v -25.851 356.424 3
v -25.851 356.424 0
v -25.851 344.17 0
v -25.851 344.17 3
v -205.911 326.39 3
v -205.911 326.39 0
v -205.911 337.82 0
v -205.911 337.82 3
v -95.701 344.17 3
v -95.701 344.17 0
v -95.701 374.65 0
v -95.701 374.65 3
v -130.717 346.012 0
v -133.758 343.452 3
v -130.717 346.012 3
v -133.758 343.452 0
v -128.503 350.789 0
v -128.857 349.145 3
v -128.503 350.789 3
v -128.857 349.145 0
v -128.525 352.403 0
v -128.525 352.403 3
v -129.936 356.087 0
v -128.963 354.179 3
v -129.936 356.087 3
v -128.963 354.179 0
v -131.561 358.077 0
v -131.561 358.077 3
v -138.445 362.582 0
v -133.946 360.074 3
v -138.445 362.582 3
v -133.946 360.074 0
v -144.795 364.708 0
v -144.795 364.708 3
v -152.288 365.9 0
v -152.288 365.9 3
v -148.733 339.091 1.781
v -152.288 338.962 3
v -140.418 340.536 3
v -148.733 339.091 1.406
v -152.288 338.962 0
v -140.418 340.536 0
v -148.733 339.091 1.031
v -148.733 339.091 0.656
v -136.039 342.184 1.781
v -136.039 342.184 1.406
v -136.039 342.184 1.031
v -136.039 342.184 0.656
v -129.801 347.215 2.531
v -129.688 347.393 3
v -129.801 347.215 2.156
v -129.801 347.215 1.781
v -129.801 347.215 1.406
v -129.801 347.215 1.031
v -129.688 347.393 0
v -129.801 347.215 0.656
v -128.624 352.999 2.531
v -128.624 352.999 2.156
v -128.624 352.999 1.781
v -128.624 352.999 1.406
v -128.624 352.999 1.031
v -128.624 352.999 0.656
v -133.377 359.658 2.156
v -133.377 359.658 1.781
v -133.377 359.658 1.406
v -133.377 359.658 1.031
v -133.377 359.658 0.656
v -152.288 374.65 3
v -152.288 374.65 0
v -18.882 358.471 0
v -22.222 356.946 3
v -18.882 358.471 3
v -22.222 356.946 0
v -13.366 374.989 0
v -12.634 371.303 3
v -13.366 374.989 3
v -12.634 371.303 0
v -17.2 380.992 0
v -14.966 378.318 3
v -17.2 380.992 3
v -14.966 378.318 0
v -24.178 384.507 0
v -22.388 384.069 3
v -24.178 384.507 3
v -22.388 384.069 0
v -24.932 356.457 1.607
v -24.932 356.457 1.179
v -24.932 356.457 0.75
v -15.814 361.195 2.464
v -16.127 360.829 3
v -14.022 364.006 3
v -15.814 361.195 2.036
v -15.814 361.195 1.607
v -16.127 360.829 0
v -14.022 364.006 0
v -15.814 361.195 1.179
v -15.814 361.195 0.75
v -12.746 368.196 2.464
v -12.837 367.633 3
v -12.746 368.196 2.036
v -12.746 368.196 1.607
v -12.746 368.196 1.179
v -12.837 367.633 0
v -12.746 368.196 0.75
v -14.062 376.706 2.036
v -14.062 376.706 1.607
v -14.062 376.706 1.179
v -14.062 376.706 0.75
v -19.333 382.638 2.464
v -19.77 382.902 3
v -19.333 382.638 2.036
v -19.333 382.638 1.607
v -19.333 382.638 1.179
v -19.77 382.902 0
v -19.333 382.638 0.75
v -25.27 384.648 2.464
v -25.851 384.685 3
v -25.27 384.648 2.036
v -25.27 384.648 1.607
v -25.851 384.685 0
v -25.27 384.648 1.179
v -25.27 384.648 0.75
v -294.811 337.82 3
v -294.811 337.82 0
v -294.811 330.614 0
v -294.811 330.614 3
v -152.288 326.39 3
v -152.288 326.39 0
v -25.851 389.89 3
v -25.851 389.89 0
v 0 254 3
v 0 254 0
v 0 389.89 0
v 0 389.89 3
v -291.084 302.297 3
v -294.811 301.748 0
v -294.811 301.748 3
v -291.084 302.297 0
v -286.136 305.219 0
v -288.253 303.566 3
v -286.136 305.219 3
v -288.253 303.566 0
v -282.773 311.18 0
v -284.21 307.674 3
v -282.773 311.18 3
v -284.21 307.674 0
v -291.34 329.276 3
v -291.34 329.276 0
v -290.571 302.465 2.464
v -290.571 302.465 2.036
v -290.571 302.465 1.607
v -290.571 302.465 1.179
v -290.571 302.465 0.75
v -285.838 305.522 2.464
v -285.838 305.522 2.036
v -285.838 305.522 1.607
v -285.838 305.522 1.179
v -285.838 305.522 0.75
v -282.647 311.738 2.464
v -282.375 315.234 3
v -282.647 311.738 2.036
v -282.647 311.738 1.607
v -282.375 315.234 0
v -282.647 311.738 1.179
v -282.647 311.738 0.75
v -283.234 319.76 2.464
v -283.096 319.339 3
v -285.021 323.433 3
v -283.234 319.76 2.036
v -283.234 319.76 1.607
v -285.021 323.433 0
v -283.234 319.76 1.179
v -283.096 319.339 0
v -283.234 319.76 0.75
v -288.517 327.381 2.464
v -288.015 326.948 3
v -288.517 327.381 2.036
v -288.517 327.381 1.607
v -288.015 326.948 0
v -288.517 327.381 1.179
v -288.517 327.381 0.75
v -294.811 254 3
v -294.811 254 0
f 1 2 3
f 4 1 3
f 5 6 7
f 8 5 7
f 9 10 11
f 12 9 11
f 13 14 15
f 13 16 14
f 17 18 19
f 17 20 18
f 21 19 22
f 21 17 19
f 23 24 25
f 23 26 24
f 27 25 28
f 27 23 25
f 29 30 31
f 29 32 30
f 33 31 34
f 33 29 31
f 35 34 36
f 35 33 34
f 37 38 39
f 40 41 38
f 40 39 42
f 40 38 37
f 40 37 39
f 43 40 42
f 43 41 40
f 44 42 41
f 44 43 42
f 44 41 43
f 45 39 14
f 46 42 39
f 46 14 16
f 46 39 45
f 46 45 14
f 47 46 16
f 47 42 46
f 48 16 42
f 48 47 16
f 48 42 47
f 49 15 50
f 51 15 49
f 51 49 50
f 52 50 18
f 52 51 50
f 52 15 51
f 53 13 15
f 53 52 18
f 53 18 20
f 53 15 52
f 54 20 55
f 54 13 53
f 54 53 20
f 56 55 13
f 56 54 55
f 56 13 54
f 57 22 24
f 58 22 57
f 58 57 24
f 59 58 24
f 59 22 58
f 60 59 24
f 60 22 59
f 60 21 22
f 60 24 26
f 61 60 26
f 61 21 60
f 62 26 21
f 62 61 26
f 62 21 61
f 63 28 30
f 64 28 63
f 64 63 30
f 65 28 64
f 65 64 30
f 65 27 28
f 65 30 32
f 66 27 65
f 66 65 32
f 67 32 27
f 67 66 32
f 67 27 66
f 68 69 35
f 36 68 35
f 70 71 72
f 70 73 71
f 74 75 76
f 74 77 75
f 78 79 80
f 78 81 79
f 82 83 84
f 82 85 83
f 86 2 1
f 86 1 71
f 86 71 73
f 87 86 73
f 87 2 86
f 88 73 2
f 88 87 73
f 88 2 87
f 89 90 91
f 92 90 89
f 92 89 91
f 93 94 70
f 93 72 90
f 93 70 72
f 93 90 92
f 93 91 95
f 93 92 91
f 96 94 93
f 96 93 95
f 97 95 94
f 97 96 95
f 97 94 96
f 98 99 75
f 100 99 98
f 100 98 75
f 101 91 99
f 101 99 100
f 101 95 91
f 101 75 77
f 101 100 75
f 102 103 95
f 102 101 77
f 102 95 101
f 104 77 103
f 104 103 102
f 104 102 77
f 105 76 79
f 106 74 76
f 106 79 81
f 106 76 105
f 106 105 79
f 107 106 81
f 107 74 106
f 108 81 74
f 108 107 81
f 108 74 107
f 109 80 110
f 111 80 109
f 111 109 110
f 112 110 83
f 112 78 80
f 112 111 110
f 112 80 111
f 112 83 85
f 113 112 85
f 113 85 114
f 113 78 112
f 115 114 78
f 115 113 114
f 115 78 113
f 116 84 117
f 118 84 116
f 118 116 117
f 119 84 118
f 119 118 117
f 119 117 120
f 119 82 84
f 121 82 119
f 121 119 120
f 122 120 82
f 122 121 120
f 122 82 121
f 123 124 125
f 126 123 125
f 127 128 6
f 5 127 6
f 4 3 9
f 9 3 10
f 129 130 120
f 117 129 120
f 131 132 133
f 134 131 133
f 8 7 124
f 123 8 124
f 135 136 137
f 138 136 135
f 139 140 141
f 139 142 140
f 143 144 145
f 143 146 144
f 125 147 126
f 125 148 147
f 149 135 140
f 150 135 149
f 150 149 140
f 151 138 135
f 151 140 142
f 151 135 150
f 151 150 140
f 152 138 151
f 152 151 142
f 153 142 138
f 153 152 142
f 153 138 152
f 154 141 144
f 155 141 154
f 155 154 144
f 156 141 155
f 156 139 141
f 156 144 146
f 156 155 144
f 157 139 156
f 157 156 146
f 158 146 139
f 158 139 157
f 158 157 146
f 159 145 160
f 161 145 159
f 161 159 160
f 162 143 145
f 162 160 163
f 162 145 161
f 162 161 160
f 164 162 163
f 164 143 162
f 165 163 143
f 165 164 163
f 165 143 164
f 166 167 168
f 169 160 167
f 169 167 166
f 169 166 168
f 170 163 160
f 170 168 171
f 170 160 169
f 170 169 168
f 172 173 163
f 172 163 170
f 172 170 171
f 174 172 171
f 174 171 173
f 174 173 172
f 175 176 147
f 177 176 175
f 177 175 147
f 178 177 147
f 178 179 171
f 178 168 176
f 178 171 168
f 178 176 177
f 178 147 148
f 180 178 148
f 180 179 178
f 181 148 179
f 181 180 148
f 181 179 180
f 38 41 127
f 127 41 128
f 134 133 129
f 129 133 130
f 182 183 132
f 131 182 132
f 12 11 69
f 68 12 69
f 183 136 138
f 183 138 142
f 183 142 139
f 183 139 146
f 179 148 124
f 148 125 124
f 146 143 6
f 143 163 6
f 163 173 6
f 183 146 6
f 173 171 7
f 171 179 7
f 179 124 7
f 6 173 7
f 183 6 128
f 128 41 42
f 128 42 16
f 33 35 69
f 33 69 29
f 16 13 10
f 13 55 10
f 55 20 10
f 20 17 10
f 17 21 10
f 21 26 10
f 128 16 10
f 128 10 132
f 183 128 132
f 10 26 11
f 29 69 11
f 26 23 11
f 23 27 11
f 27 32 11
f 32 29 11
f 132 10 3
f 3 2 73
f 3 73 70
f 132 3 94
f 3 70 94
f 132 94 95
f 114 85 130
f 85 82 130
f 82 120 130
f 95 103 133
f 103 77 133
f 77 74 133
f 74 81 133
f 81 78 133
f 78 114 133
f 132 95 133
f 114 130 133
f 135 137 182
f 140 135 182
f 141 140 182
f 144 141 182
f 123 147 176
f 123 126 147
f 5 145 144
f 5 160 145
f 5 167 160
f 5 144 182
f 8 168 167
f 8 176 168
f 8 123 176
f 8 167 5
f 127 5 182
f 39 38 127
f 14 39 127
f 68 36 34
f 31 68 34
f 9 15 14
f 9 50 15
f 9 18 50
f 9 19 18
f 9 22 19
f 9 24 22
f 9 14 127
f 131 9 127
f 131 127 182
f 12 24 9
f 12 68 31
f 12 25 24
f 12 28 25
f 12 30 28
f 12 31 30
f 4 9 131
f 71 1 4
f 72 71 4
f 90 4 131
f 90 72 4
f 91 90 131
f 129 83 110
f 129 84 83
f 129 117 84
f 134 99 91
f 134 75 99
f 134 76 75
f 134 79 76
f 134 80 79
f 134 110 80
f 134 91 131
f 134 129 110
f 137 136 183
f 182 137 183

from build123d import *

# Parameters (mm, degrees)
BOSS_EXTRUDE2_OUTLINE_W = 330.2
BOSS_EXTRUDE2_OUTLINE_H = 190.5
BOSS_EXTRUDE2_DEPTH     = 3
CUT_EXTRUDE1_DEPTH      = 554.733952504


# Read off the part's stored shape, not the designer's step: Boss-Extrude2
with BuildPart() as part:
    # Boss-Extrude2 outline → Boss-Extrude2 (new body)
    with BuildSketch(Plane.XY):
        with Locations((-165.1, 349.25)):
            Rectangle(BOSS_EXTRUDE2_OUTLINE_W, BOSS_EXTRUDE2_OUTLINE_H)
        with BuildLine():
            add(Edge.make_bspline(
                [(-305.942171993, 328.501522762), (-306.170255378, 328.324665909), (-306.614042299, 327.954986533), (-307.512202671, 327.084665698), (-309.028565354, 325.224006494), (-310.814681605, 321.397067185), (-310.908770444, 315.937871104), (-309.331820466, 311.311401642), (-307.336526947, 308.049254205), (-304.674018188, 305.304468379), (-300.585989718, 302.625100143), (-295.275340887, 301.356761249), (-291.124175679, 302.133615904), (-288.944522893, 303.138863231), (-287.877956893, 303.791999802), (-287.175136962, 304.298621856), (-286.509456581, 304.853140919), (-285.611296208, 305.723461755), (-284.094933526, 307.584120959), (-282.308817275, 311.411060268), (-282.214728435, 316.870256349), (-283.791678414, 321.496725811), (-285.786971933, 324.758873247), (-288.449480692, 327.503659074), (-292.537509162, 330.18302731), (-297.848157993, 331.451366204), (-301.999323201, 330.674511549), (-304.178975987, 329.669264222), (-305.245541986, 329.01612765), (-305.714088607, 328.678379615), (-305.942171993, 328.501522762)],
                knots=[0, 0, 0, 0, 0.015625, 0.03125, 0.0625, 0.125, 0.1875, 0.21875, 0.25, 0.28125, 0.3125, 0.375, 0.4375, 0.46875, 0.484375, 0.5, 0.515625, 0.53125, 0.5625, 0.625, 0.6875, 0.71875, 0.75, 0.78125, 0.8125, 0.875, 0.9375, 0.96875, 0.984375, 1, 1, 1, 1], degree=3))
        make_face(mode=Mode.SUBTRACT)
        with BuildLine():
            add(Edge.make_bspline(
                [(-180.068905291, 353.920439433), (-180.085422965, 353.618309147), (-180.081950788, 353.012052683), (-179.905256871, 351.701966023), (-179.071932531, 349.235984489), (-176.547678646, 346.101494923), (-171.788832257, 343.101891305), (-167.066920591, 341.126264084), (-161.345782684, 339.656260684), (-155.018201929, 338.900335341), (-148.645925657, 338.961950616), (-142.798632236, 339.799499783), (-137.889488846, 341.248590487), (-132.832001497, 343.711528272), (-129.981083909, 346.552153454), (-128.883895778, 348.912592521), (-128.565435113, 350.195608733), (-128.461120803, 351.099005754), (-128.466329068, 352.008390451), (-128.643022986, 353.31847711), (-129.476347326, 355.784458645), (-132.000601211, 358.918948211), (-136.7594476, 361.918551828), (-141.481359266, 363.89417905), (-147.202497173, 365.36418245), (-153.530077928, 366.120107793), (-159.9023542, 366.058492517), (-165.74964762, 365.220943351), (-170.658791011, 363.771852646), (-175.71627836, 361.308914861), (-178.567195948, 358.468289679), (-179.664384078, 356.107850612), (-179.982844744, 354.8248344), (-180.052387617, 354.22256972), (-180.068905291, 353.920439433)],
                knots=[0, 0, 0, 0, 0.015625, 0.03125, 0.0625, 0.125, 0.15625, 0.1875, 0.21875, 0.25, 0.28125, 0.3125, 0.34375, 0.375, 0.4375, 0.46875, 0.484375, 0.5, 0.515625, 0.53125, 0.5625, 0.625, 0.65625, 0.6875, 0.71875, 0.75, 0.78125, 0.8125, 0.84375, 0.875, 0.9375, 0.96875, 0.984375, 1, 1, 1, 1], degree=3))
        make_face(mode=Mode.SUBTRACT)
        with BuildLine():
            add(Edge.make_bspline(
                [(-29.09461346, 384.409392838), (-29.375319528, 384.349132794), (-29.932845744, 384.210511135), (-31.115639474, 383.827797032), (-33.287380866, 382.853955405), (-36.5808932, 380.334793707), (-39.113343797, 375.767453995), (-39.778124595, 371.238575823), (-39.453462961, 367.698185468), (-38.296430811, 364.336482677), (-35.831427961, 360.479484886), (-31.647527324, 357.353965166), (-27.610258166, 356.408525111), (-25.230170518, 356.411838769), (-23.994513151, 356.548301078), (-23.146566065, 356.701928853), (-22.310276741, 356.909861342), (-21.127483011, 357.292575445), (-18.955741619, 358.266417073), (-15.662229285, 360.78557877), (-13.129778688, 365.352918482), (-12.46499789, 369.881796654), (-12.789659524, 373.42218701), (-13.946691674, 376.7838898), (-16.411694524, 380.640887591), (-20.595595161, 383.766407311), (-24.632864319, 384.711847366), (-27.012951967, 384.708533708), (-28.248609334, 384.572071399), (-28.813907391, 384.469652882), (-29.09461346, 384.409392838)],
                knots=[0, 0, 0, 0, 0.015625, 0.03125, 0.0625, 0.125, 0.1875, 0.21875, 0.25, 0.28125, 0.3125, 0.375, 0.4375, 0.46875, 0.484375, 0.5, 0.515625, 0.53125, 0.5625, 0.625, 0.6875, 0.71875, 0.75, 0.78125, 0.8125, 0.875, 0.9375, 0.96875, 0.984375, 1, 1, 1, 1], degree=3))
        make_face(mode=Mode.SUBTRACT)
    extrude(amount=BOSS_EXTRUDE2_DEPTH)

    # Sketch9 → Cut-Extrude1 (cut, through all)
    with BuildSketch(Plane(origin=(0, 0, 0), x_dir=(-1, 0, 0), z_dir=(0, 0, -1))):
        Polygon((330.2, 444.5), (0, 444.5), (0, 389.89), (25.851104386, 389.89), (25.851104386, 344.17), (95.701104386, 344.17), (95.701104386, 374.65), (152.287972712, 374.65), (152.287972712, 326.39), (205.910863718, 326.39), (205.910863718, 337.82), (294.810863718, 337.82), (294.810863718, 254), (330.2, 254), align=None)
    extrude(amount=-CUT_EXTRUDE1_DEPTH, mode=Mode.SUBTRACT)


solid = part.part
